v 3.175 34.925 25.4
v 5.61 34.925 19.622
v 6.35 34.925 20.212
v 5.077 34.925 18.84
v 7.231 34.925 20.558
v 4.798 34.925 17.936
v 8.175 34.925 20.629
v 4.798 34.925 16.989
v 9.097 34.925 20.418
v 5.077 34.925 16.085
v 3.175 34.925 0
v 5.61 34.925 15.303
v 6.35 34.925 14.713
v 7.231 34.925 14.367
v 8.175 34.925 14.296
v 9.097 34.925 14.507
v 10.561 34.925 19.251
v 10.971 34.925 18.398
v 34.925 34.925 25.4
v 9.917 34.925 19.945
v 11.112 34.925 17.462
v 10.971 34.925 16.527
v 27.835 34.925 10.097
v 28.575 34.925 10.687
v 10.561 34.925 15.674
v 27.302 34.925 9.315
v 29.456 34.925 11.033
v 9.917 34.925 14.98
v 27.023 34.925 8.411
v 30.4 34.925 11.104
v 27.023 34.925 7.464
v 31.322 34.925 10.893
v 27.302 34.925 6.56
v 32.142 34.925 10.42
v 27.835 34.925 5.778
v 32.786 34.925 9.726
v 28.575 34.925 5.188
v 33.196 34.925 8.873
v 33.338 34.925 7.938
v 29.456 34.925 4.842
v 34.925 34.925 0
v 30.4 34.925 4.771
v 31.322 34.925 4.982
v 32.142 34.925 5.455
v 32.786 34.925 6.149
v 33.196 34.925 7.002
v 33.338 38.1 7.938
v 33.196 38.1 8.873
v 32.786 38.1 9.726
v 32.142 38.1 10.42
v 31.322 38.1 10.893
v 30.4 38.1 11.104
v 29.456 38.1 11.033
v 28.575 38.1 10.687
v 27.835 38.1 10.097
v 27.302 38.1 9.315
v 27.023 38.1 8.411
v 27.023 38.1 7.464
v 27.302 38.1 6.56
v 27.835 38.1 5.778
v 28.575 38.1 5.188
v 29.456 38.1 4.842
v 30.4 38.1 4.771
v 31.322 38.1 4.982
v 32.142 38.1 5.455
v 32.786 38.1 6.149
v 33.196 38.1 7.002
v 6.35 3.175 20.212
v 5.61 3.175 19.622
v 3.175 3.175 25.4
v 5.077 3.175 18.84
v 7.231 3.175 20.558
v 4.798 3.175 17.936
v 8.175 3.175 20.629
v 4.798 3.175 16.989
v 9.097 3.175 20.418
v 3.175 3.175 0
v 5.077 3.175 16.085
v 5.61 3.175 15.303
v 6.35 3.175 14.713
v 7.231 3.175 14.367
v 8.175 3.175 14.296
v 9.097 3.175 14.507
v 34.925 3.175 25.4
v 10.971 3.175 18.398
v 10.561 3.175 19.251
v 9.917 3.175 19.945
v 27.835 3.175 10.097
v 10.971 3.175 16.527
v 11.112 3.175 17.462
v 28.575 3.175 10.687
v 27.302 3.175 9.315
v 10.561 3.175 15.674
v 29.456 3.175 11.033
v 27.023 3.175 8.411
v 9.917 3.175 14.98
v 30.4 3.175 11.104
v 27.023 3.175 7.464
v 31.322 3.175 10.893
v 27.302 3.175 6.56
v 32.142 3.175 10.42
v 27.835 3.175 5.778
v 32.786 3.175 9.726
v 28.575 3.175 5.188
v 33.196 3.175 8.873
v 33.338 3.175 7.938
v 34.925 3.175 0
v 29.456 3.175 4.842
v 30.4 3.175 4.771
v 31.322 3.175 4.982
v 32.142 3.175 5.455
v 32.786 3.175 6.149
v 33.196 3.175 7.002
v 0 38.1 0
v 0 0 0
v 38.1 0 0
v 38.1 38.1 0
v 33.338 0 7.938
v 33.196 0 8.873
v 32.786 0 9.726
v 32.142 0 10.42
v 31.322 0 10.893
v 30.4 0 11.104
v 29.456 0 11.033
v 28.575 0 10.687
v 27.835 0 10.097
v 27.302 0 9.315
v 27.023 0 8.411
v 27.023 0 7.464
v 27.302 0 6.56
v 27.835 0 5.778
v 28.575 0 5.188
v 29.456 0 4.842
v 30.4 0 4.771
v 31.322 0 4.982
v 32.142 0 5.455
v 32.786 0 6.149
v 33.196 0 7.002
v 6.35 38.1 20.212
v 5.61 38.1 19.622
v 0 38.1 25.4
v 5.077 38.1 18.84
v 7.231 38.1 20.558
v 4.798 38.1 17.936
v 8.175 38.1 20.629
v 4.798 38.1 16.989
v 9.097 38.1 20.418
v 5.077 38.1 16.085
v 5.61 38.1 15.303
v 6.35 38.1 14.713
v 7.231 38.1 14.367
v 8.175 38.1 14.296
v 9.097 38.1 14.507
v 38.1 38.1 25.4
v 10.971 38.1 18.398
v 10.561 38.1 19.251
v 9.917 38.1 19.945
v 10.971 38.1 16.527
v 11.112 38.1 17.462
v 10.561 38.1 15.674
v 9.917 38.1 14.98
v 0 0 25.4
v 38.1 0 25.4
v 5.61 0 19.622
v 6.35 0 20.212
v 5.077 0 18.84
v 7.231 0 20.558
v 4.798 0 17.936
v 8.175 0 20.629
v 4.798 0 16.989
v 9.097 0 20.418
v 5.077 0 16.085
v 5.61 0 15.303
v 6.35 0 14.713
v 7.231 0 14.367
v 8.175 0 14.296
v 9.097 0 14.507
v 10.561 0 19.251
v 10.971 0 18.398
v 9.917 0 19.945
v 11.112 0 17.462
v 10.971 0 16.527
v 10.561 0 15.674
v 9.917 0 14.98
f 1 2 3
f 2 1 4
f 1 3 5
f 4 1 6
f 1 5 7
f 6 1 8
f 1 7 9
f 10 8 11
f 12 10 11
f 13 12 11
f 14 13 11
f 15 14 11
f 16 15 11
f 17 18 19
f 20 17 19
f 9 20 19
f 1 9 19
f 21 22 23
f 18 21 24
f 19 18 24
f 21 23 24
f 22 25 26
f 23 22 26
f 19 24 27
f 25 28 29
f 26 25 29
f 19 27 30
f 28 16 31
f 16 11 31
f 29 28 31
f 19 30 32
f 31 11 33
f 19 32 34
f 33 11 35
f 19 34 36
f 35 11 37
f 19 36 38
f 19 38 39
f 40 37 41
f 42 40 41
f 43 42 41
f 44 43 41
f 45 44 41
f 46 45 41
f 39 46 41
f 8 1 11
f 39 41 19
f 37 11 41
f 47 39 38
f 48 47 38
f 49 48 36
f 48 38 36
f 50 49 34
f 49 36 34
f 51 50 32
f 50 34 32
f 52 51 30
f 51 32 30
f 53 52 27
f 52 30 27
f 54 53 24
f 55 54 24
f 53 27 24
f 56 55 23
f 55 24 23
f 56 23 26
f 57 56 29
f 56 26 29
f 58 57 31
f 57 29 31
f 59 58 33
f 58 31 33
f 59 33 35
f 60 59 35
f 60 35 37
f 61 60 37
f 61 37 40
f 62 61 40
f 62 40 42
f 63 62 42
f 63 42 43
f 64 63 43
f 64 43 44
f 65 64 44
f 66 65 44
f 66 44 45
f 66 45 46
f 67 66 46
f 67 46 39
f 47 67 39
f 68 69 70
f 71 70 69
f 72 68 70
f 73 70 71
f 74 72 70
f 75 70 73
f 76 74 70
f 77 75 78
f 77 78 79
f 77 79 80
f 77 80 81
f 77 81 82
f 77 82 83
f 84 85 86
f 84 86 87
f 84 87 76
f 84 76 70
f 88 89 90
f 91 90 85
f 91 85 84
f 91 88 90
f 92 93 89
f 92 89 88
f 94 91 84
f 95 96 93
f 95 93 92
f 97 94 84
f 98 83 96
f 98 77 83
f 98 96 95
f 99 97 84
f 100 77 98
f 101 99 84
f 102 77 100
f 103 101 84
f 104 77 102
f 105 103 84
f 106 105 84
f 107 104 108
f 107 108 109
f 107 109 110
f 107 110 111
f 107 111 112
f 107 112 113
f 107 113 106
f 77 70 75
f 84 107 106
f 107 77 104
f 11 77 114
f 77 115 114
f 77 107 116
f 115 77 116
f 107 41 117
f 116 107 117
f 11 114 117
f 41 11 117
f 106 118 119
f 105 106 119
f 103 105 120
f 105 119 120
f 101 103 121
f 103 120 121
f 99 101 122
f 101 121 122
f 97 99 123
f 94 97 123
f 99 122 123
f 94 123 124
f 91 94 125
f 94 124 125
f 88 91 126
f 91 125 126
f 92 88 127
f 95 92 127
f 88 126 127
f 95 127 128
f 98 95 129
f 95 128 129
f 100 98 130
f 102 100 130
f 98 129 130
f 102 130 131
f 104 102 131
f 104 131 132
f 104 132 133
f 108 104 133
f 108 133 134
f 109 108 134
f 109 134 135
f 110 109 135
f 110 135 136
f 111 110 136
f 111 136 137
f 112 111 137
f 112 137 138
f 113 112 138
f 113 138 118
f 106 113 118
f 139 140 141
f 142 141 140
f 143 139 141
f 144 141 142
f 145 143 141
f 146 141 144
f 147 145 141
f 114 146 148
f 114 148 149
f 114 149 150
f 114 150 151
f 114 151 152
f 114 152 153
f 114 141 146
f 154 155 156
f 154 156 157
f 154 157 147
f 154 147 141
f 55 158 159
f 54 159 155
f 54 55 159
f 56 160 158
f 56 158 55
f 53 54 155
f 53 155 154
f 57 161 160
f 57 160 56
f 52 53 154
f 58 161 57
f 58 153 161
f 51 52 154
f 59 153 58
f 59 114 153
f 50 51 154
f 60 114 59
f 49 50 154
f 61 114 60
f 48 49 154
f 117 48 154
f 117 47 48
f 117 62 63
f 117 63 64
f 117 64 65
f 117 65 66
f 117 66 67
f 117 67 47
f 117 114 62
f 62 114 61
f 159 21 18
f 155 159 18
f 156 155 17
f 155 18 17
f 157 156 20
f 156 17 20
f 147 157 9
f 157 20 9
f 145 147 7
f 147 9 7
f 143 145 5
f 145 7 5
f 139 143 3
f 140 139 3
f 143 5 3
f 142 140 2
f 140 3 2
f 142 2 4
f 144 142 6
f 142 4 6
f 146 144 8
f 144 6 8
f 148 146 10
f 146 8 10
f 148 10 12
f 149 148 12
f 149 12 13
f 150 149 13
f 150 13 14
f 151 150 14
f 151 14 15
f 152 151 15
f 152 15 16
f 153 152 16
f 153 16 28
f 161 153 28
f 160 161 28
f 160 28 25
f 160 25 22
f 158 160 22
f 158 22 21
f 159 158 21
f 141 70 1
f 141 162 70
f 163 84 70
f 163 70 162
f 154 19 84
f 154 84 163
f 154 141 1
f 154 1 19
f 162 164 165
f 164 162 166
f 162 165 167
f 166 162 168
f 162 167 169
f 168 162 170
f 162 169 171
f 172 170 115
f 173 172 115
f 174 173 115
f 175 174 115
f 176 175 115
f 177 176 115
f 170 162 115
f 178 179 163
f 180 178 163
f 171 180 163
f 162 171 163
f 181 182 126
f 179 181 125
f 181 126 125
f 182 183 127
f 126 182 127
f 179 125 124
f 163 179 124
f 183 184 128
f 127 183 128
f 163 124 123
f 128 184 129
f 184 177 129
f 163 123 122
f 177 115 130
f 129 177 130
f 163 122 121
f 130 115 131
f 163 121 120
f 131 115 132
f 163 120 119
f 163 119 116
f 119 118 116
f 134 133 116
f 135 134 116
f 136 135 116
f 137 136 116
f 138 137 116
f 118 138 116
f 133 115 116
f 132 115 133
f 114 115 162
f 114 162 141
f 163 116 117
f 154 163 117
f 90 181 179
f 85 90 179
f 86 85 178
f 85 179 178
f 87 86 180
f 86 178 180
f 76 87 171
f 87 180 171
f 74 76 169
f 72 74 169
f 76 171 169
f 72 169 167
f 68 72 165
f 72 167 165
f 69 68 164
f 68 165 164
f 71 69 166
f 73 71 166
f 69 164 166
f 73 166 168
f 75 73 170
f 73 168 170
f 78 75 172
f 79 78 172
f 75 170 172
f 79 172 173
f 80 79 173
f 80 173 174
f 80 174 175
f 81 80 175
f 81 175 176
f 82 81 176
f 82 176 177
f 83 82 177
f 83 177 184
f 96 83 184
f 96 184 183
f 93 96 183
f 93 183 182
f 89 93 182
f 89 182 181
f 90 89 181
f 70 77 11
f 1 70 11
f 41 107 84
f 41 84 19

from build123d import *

# Parameters (mm, degrees)
SKETCH1_W           = 38.1
SKETCH1_H           = 38.1
SKETCH1_W_2         = 31.75
SKETCH1_H_2         = 31.75
BOSS_EXTRUDE1_DEPTH = 25.4
SKETCH2_R           = 3.175
CUT_EXTRUDE1_DEPTH  = 39.1


with BuildPart() as part:
    # Sketch1 → Boss-Extrude1 (new body)
    with BuildSketch(Plane.XY):
        with Locations((19.05, 19.05)):
            Rectangle(SKETCH1_W, SKETCH1_H)
        with Locations((19.05, 19.05)):
            Rectangle(SKETCH1_W_2, SKETCH1_H_2, mode=Mode.SUBTRACT)
    extrude(amount=BOSS_EXTRUDE1_DEPTH)

    # Sketch2 → Cut-Extrude1 (cut, through all)
    with BuildSketch(Plane.XZ):
        with Locations((7.9375, 17.4625)):
            Circle(SKETCH2_R)
        with Locations((30.1625, 7.9375)):
            Circle(SKETCH2_R)
    extrude(amount=-CUT_EXTRUDE1_DEPTH, mode=Mode.SUBTRACT)


solid = part.part
